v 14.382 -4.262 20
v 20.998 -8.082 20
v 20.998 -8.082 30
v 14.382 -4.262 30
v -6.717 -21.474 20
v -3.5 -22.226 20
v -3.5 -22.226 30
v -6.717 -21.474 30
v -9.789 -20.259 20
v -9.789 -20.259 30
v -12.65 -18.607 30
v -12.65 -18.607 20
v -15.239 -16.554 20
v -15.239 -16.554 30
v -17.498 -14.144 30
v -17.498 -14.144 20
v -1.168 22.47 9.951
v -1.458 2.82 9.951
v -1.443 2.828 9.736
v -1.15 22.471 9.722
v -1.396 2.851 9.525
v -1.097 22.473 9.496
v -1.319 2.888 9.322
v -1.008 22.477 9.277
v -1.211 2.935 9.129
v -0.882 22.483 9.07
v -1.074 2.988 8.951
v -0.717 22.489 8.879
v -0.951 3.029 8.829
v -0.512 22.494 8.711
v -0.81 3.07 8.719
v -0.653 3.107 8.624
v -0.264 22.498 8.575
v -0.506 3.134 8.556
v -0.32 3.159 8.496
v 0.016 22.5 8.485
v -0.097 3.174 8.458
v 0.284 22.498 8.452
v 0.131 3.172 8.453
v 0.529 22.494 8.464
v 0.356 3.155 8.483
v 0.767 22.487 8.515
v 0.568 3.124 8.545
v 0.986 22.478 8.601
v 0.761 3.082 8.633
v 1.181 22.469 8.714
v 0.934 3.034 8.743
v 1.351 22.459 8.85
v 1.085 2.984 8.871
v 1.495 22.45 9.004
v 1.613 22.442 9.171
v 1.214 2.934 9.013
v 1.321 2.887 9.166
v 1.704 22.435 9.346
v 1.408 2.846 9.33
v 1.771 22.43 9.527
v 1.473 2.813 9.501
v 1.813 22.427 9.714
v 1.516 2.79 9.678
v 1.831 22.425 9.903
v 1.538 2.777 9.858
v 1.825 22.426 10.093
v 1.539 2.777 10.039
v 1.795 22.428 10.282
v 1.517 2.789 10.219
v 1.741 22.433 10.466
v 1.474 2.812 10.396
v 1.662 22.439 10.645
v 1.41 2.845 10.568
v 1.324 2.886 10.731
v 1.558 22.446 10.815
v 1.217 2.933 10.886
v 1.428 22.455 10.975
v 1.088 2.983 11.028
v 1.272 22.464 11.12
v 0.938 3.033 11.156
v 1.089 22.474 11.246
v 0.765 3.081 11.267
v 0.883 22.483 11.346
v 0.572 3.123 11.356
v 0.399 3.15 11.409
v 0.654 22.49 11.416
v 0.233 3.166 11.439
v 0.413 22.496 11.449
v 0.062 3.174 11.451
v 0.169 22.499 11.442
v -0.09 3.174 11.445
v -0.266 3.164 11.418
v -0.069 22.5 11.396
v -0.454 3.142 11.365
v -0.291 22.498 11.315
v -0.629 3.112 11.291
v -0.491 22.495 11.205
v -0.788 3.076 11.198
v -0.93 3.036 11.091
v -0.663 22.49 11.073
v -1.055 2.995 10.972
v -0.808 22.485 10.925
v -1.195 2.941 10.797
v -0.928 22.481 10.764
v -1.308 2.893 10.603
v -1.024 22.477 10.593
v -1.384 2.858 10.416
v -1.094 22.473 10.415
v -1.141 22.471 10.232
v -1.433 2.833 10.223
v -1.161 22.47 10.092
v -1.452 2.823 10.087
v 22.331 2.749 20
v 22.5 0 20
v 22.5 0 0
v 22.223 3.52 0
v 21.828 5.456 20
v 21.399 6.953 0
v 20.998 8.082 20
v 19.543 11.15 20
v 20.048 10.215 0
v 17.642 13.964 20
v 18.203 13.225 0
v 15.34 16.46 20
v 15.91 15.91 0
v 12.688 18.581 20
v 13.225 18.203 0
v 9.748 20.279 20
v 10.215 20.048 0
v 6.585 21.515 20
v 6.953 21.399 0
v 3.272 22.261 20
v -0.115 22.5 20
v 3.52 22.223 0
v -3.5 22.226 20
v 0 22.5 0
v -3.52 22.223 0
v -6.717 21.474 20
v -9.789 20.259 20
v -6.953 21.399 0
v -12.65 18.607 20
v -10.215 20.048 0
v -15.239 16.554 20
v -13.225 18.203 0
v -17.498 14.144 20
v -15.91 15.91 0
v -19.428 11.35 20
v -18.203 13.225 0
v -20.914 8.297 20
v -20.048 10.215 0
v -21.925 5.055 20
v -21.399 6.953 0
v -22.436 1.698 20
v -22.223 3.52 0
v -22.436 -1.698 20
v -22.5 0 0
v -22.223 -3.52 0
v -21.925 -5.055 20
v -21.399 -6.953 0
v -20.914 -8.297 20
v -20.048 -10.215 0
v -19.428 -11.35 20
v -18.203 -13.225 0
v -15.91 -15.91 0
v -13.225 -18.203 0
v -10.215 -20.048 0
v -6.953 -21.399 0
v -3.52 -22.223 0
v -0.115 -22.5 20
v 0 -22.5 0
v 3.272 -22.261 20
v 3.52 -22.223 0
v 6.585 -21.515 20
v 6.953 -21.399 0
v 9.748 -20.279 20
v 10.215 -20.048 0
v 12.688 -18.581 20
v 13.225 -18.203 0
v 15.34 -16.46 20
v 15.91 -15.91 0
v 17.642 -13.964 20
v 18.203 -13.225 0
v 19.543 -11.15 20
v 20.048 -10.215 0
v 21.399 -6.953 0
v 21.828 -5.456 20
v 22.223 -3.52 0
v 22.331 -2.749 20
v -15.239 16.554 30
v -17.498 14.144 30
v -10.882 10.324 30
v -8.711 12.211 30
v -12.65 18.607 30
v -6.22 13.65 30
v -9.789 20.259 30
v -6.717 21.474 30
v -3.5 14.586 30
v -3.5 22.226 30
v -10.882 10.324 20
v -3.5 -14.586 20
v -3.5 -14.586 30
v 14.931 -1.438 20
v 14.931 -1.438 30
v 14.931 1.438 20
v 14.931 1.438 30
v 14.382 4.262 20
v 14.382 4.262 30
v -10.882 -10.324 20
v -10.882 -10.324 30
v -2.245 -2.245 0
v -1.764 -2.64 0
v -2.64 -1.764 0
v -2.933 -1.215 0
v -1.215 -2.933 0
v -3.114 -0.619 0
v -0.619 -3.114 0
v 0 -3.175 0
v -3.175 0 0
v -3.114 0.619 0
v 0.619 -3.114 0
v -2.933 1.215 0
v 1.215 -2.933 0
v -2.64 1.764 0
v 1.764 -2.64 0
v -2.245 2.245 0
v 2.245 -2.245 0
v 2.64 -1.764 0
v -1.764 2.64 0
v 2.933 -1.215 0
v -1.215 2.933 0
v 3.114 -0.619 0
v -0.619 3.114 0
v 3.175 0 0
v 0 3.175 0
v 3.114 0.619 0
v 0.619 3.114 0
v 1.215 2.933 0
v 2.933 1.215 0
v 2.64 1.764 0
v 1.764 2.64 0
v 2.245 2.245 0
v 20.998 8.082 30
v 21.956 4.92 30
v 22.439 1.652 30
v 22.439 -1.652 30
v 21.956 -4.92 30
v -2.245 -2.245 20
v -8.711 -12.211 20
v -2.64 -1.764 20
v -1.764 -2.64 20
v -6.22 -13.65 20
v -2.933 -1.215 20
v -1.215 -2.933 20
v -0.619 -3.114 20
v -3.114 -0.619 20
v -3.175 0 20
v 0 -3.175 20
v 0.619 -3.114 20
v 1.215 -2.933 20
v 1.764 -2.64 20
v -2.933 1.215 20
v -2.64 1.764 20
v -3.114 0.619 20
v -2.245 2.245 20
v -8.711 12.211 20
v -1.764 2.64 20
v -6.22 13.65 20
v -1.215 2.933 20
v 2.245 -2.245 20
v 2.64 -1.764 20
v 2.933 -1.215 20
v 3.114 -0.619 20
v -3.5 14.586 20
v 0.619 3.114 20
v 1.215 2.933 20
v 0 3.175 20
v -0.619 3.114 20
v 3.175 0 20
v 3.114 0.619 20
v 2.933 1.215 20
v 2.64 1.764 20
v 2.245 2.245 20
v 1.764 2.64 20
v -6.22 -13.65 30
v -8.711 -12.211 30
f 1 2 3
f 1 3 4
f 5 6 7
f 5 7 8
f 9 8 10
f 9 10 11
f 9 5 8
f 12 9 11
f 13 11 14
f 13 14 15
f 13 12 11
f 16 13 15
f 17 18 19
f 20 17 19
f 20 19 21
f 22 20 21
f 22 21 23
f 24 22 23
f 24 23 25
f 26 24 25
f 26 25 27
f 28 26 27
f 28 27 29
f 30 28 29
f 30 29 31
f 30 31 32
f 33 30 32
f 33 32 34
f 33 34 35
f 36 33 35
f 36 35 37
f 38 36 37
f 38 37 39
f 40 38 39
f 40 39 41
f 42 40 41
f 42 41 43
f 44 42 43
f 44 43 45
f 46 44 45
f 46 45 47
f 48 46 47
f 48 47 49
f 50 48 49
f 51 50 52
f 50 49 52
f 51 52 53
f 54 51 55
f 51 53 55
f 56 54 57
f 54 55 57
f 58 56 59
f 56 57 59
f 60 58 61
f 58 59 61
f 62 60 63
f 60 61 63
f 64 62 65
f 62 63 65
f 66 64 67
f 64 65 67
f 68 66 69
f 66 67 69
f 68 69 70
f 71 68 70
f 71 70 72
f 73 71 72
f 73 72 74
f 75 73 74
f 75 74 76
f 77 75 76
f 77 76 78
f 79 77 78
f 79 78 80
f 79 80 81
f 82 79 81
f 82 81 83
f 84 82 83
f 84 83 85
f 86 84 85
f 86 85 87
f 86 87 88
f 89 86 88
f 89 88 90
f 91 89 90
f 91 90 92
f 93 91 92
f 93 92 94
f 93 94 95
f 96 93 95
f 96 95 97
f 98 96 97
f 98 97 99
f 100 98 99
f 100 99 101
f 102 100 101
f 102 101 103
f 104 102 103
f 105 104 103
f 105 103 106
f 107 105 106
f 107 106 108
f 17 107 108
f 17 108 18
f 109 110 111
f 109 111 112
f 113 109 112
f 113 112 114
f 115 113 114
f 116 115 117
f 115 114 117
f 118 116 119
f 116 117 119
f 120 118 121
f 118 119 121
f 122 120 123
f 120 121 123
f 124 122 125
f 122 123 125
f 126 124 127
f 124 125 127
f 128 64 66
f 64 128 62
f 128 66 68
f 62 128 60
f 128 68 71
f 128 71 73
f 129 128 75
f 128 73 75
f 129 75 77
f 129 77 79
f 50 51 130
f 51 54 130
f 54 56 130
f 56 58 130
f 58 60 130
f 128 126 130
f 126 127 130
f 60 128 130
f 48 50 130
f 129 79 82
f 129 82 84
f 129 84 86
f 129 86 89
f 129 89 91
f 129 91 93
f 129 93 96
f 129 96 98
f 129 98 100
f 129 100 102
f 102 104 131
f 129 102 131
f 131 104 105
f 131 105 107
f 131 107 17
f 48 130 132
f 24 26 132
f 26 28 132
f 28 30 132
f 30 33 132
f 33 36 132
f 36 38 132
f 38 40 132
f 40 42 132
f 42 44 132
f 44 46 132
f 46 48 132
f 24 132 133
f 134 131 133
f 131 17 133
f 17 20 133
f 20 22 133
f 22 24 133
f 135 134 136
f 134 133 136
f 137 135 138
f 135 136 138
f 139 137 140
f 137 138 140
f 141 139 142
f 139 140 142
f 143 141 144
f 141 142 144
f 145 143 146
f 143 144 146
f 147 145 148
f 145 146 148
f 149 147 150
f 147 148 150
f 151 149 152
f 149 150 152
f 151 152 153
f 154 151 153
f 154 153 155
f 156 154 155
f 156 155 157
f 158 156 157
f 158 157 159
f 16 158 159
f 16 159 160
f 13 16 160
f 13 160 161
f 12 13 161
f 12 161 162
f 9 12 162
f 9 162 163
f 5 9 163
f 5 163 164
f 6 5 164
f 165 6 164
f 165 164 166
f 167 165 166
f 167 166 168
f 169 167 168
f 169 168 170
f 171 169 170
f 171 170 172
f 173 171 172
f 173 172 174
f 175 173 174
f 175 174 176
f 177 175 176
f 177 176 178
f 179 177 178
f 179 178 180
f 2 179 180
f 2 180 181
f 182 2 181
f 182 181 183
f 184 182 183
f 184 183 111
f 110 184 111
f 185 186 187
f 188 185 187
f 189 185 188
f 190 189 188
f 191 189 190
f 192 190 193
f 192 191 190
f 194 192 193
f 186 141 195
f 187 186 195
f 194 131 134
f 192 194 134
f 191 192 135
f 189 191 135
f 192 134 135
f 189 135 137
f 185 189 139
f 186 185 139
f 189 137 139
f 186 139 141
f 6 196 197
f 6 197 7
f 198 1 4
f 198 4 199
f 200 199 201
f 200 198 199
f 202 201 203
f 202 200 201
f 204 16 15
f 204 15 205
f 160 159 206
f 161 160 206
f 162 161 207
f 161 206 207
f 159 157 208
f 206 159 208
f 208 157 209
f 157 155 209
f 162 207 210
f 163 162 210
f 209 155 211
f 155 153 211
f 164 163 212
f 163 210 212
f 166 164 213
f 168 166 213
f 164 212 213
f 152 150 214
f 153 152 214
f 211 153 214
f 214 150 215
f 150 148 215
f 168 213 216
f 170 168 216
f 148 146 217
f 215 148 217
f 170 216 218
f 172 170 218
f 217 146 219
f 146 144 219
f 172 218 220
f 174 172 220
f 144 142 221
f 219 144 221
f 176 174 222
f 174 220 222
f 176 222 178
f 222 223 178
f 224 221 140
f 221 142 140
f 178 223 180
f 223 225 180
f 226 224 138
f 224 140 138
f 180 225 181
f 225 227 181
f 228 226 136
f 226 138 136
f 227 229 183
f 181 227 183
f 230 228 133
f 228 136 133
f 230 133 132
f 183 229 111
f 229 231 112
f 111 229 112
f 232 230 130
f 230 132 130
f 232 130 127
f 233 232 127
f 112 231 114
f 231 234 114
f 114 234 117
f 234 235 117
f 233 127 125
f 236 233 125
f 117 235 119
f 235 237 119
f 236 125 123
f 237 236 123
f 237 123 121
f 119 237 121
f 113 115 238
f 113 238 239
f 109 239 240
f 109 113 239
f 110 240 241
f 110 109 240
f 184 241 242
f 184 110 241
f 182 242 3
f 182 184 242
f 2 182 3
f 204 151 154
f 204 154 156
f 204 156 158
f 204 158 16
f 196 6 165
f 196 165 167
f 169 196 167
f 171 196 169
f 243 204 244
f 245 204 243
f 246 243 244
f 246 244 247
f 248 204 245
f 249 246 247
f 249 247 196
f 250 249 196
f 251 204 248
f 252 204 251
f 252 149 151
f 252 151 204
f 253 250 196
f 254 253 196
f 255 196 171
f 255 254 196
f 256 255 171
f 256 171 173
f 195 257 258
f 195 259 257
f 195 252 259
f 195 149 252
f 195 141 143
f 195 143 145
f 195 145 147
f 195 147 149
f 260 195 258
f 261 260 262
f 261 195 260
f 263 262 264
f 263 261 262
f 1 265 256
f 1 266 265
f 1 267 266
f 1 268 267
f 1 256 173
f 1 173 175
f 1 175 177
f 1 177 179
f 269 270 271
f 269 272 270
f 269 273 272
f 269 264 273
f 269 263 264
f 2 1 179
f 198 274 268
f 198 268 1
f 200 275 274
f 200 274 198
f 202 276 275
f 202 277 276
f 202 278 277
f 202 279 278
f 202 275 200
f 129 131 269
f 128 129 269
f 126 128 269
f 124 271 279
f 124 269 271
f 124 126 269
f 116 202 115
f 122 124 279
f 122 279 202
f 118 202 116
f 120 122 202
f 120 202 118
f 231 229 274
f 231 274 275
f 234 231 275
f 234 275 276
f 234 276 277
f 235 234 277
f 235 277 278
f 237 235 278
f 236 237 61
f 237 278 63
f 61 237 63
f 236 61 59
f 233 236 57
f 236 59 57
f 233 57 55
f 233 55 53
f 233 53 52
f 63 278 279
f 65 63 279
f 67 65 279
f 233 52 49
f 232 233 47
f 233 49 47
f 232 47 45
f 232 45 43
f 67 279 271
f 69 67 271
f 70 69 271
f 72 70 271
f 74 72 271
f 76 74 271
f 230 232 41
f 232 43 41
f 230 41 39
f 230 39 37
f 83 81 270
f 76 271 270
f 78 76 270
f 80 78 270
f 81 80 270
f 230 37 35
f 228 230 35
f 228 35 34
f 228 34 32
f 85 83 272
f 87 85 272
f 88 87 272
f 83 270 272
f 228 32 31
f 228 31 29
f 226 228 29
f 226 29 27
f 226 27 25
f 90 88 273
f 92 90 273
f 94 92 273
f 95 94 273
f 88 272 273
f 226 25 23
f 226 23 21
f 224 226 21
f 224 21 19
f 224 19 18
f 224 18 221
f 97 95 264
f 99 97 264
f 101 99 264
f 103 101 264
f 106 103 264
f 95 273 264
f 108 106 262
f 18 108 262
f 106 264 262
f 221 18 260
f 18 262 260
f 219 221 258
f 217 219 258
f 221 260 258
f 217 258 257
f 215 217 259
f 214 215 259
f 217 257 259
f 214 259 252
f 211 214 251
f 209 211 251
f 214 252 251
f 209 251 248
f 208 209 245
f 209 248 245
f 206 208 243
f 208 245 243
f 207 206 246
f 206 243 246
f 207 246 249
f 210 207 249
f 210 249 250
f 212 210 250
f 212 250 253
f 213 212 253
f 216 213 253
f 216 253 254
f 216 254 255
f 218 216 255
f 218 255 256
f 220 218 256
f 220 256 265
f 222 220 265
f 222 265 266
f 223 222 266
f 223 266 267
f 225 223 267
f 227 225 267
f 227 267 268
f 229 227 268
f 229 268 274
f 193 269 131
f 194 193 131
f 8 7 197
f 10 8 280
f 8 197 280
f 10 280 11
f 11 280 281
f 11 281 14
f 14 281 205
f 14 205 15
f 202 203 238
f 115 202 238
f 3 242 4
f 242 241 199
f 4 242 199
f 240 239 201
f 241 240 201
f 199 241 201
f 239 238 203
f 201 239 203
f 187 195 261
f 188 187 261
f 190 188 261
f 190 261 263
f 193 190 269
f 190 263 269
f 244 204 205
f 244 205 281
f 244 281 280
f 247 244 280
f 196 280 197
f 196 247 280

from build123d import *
from build123d.topology import SkipClean

# Parameters (mm, degrees)
SKETCH1_R                 = 22.5
BOSS_EXTRUDE1_DEPTH       = 20
CUT_EXTRUDE1_REACH        = 39.583
SKETCH3_R                 = 3.175
F_3_0MM_DOWEL_HOLE1_D     = 3
F_3_0MM_DOWEL_HOLE1_DEPTH = 22
F_3_0MM_DOWEL_HOLE1_TIP   = 0.901290929
BOSS_EXTRUDE3_DEPTH       = 10


with BuildPart() as part:
    # Sketch1 → Boss-Extrude1 (new body)
    with BuildSketch(Plane.XY):
        Circle(SKETCH1_R)
    extrude(amount=BOSS_EXTRUDE1_DEPTH)

    # Sketch3 → Cut-Extrude1 (cut, up to next)
    with BuildSketch(Plane.XY.offset(20), mode=Mode.PRIVATE) as cut_extrude1_sk1:
        Circle(SKETCH3_R)
    cut_extrude1_tool1 = extrude(cut_extrude1_sk1.sketch, amount=-CUT_EXTRUDE1_REACH, mode=Mode.PRIVATE) & part.part
    add(cut_extrude1_tool1.solids().sort_by_distance((0, 0, 20))[0], mode=Mode.SUBTRACT)

    # Ø3.0mm Dowel Hole1
    with Locations(Plane(origin=(0.332625349, 22.497541207, 9.950983977), x_dir=(0.999890720328, -0.014783348841, 0), z_dir=(0.014783348841, 0.999890720328, 0))):
        with Locations((0, 0)):
            Hole(F_3_0MM_DOWEL_HOLE1_D / 2, depth=F_3_0MM_DOWEL_HOLE1_DEPTH)
            with Locations((0, 0, -(F_3_0MM_DOWEL_HOLE1_DEPTH + F_3_0MM_DOWEL_HOLE1_TIP / 2))):  # 118° drill point
                Cone(0, F_3_0MM_DOWEL_HOLE1_D / 2, F_3_0MM_DOWEL_HOLE1_TIP, mode=Mode.SUBTRACT)

    # Sketch6 → Boss-Extrude3 (add)
    with SkipClean():  # the faces are left unmerged after this step: merging them gives an invalid solid
        with BuildSketch(Plane.XY.offset(20)):
            with BuildLine():
                Line((-17.498376555, 14.144144299), (-10.881805097, 10.324064986))
                ThreePointArc((-10.881805097, 10.324064986), (-7.5, 12.990381057), (-3.5, 14.585952146))
                Line((-3.5, 14.585952146), (-3.5, 22.226110771))
                ThreePointArc((-3.5, 22.226110771), (-11.25, 19.485571585), (-17.498376555, 14.144144299))
            make_face()
            with BuildLine():
                Line((14.381805097, 4.26188716), (20.998376555, 8.081966472))
                ThreePointArc((20.998376555, 8.081966472), (22.5, 0), (20.998376555, -8.081966472))
                Line((20.998376555, -8.081966472), (14.381805097, -4.26188716))
                ThreePointArc((14.381805097, -4.26188716), (15, 0), (14.381805097, 4.26188716))
            make_face()
            with BuildLine():
                Line((-3.5, -14.585952146), (-3.5, -22.226110771))
                ThreePointArc((-3.5, -22.226110771), (-11.25, -19.485571585), (-17.498376555, -14.144144299))
                Line((-17.498376555, -14.144144299), (-10.881805097, -10.324064986))
                ThreePointArc((-10.881805097, -10.324064986), (-7.5, -12.990381057), (-3.5, -14.585952146))
            make_face()
        extrude(amount=BOSS_EXTRUDE3_DEPTH)


solid = part.part
